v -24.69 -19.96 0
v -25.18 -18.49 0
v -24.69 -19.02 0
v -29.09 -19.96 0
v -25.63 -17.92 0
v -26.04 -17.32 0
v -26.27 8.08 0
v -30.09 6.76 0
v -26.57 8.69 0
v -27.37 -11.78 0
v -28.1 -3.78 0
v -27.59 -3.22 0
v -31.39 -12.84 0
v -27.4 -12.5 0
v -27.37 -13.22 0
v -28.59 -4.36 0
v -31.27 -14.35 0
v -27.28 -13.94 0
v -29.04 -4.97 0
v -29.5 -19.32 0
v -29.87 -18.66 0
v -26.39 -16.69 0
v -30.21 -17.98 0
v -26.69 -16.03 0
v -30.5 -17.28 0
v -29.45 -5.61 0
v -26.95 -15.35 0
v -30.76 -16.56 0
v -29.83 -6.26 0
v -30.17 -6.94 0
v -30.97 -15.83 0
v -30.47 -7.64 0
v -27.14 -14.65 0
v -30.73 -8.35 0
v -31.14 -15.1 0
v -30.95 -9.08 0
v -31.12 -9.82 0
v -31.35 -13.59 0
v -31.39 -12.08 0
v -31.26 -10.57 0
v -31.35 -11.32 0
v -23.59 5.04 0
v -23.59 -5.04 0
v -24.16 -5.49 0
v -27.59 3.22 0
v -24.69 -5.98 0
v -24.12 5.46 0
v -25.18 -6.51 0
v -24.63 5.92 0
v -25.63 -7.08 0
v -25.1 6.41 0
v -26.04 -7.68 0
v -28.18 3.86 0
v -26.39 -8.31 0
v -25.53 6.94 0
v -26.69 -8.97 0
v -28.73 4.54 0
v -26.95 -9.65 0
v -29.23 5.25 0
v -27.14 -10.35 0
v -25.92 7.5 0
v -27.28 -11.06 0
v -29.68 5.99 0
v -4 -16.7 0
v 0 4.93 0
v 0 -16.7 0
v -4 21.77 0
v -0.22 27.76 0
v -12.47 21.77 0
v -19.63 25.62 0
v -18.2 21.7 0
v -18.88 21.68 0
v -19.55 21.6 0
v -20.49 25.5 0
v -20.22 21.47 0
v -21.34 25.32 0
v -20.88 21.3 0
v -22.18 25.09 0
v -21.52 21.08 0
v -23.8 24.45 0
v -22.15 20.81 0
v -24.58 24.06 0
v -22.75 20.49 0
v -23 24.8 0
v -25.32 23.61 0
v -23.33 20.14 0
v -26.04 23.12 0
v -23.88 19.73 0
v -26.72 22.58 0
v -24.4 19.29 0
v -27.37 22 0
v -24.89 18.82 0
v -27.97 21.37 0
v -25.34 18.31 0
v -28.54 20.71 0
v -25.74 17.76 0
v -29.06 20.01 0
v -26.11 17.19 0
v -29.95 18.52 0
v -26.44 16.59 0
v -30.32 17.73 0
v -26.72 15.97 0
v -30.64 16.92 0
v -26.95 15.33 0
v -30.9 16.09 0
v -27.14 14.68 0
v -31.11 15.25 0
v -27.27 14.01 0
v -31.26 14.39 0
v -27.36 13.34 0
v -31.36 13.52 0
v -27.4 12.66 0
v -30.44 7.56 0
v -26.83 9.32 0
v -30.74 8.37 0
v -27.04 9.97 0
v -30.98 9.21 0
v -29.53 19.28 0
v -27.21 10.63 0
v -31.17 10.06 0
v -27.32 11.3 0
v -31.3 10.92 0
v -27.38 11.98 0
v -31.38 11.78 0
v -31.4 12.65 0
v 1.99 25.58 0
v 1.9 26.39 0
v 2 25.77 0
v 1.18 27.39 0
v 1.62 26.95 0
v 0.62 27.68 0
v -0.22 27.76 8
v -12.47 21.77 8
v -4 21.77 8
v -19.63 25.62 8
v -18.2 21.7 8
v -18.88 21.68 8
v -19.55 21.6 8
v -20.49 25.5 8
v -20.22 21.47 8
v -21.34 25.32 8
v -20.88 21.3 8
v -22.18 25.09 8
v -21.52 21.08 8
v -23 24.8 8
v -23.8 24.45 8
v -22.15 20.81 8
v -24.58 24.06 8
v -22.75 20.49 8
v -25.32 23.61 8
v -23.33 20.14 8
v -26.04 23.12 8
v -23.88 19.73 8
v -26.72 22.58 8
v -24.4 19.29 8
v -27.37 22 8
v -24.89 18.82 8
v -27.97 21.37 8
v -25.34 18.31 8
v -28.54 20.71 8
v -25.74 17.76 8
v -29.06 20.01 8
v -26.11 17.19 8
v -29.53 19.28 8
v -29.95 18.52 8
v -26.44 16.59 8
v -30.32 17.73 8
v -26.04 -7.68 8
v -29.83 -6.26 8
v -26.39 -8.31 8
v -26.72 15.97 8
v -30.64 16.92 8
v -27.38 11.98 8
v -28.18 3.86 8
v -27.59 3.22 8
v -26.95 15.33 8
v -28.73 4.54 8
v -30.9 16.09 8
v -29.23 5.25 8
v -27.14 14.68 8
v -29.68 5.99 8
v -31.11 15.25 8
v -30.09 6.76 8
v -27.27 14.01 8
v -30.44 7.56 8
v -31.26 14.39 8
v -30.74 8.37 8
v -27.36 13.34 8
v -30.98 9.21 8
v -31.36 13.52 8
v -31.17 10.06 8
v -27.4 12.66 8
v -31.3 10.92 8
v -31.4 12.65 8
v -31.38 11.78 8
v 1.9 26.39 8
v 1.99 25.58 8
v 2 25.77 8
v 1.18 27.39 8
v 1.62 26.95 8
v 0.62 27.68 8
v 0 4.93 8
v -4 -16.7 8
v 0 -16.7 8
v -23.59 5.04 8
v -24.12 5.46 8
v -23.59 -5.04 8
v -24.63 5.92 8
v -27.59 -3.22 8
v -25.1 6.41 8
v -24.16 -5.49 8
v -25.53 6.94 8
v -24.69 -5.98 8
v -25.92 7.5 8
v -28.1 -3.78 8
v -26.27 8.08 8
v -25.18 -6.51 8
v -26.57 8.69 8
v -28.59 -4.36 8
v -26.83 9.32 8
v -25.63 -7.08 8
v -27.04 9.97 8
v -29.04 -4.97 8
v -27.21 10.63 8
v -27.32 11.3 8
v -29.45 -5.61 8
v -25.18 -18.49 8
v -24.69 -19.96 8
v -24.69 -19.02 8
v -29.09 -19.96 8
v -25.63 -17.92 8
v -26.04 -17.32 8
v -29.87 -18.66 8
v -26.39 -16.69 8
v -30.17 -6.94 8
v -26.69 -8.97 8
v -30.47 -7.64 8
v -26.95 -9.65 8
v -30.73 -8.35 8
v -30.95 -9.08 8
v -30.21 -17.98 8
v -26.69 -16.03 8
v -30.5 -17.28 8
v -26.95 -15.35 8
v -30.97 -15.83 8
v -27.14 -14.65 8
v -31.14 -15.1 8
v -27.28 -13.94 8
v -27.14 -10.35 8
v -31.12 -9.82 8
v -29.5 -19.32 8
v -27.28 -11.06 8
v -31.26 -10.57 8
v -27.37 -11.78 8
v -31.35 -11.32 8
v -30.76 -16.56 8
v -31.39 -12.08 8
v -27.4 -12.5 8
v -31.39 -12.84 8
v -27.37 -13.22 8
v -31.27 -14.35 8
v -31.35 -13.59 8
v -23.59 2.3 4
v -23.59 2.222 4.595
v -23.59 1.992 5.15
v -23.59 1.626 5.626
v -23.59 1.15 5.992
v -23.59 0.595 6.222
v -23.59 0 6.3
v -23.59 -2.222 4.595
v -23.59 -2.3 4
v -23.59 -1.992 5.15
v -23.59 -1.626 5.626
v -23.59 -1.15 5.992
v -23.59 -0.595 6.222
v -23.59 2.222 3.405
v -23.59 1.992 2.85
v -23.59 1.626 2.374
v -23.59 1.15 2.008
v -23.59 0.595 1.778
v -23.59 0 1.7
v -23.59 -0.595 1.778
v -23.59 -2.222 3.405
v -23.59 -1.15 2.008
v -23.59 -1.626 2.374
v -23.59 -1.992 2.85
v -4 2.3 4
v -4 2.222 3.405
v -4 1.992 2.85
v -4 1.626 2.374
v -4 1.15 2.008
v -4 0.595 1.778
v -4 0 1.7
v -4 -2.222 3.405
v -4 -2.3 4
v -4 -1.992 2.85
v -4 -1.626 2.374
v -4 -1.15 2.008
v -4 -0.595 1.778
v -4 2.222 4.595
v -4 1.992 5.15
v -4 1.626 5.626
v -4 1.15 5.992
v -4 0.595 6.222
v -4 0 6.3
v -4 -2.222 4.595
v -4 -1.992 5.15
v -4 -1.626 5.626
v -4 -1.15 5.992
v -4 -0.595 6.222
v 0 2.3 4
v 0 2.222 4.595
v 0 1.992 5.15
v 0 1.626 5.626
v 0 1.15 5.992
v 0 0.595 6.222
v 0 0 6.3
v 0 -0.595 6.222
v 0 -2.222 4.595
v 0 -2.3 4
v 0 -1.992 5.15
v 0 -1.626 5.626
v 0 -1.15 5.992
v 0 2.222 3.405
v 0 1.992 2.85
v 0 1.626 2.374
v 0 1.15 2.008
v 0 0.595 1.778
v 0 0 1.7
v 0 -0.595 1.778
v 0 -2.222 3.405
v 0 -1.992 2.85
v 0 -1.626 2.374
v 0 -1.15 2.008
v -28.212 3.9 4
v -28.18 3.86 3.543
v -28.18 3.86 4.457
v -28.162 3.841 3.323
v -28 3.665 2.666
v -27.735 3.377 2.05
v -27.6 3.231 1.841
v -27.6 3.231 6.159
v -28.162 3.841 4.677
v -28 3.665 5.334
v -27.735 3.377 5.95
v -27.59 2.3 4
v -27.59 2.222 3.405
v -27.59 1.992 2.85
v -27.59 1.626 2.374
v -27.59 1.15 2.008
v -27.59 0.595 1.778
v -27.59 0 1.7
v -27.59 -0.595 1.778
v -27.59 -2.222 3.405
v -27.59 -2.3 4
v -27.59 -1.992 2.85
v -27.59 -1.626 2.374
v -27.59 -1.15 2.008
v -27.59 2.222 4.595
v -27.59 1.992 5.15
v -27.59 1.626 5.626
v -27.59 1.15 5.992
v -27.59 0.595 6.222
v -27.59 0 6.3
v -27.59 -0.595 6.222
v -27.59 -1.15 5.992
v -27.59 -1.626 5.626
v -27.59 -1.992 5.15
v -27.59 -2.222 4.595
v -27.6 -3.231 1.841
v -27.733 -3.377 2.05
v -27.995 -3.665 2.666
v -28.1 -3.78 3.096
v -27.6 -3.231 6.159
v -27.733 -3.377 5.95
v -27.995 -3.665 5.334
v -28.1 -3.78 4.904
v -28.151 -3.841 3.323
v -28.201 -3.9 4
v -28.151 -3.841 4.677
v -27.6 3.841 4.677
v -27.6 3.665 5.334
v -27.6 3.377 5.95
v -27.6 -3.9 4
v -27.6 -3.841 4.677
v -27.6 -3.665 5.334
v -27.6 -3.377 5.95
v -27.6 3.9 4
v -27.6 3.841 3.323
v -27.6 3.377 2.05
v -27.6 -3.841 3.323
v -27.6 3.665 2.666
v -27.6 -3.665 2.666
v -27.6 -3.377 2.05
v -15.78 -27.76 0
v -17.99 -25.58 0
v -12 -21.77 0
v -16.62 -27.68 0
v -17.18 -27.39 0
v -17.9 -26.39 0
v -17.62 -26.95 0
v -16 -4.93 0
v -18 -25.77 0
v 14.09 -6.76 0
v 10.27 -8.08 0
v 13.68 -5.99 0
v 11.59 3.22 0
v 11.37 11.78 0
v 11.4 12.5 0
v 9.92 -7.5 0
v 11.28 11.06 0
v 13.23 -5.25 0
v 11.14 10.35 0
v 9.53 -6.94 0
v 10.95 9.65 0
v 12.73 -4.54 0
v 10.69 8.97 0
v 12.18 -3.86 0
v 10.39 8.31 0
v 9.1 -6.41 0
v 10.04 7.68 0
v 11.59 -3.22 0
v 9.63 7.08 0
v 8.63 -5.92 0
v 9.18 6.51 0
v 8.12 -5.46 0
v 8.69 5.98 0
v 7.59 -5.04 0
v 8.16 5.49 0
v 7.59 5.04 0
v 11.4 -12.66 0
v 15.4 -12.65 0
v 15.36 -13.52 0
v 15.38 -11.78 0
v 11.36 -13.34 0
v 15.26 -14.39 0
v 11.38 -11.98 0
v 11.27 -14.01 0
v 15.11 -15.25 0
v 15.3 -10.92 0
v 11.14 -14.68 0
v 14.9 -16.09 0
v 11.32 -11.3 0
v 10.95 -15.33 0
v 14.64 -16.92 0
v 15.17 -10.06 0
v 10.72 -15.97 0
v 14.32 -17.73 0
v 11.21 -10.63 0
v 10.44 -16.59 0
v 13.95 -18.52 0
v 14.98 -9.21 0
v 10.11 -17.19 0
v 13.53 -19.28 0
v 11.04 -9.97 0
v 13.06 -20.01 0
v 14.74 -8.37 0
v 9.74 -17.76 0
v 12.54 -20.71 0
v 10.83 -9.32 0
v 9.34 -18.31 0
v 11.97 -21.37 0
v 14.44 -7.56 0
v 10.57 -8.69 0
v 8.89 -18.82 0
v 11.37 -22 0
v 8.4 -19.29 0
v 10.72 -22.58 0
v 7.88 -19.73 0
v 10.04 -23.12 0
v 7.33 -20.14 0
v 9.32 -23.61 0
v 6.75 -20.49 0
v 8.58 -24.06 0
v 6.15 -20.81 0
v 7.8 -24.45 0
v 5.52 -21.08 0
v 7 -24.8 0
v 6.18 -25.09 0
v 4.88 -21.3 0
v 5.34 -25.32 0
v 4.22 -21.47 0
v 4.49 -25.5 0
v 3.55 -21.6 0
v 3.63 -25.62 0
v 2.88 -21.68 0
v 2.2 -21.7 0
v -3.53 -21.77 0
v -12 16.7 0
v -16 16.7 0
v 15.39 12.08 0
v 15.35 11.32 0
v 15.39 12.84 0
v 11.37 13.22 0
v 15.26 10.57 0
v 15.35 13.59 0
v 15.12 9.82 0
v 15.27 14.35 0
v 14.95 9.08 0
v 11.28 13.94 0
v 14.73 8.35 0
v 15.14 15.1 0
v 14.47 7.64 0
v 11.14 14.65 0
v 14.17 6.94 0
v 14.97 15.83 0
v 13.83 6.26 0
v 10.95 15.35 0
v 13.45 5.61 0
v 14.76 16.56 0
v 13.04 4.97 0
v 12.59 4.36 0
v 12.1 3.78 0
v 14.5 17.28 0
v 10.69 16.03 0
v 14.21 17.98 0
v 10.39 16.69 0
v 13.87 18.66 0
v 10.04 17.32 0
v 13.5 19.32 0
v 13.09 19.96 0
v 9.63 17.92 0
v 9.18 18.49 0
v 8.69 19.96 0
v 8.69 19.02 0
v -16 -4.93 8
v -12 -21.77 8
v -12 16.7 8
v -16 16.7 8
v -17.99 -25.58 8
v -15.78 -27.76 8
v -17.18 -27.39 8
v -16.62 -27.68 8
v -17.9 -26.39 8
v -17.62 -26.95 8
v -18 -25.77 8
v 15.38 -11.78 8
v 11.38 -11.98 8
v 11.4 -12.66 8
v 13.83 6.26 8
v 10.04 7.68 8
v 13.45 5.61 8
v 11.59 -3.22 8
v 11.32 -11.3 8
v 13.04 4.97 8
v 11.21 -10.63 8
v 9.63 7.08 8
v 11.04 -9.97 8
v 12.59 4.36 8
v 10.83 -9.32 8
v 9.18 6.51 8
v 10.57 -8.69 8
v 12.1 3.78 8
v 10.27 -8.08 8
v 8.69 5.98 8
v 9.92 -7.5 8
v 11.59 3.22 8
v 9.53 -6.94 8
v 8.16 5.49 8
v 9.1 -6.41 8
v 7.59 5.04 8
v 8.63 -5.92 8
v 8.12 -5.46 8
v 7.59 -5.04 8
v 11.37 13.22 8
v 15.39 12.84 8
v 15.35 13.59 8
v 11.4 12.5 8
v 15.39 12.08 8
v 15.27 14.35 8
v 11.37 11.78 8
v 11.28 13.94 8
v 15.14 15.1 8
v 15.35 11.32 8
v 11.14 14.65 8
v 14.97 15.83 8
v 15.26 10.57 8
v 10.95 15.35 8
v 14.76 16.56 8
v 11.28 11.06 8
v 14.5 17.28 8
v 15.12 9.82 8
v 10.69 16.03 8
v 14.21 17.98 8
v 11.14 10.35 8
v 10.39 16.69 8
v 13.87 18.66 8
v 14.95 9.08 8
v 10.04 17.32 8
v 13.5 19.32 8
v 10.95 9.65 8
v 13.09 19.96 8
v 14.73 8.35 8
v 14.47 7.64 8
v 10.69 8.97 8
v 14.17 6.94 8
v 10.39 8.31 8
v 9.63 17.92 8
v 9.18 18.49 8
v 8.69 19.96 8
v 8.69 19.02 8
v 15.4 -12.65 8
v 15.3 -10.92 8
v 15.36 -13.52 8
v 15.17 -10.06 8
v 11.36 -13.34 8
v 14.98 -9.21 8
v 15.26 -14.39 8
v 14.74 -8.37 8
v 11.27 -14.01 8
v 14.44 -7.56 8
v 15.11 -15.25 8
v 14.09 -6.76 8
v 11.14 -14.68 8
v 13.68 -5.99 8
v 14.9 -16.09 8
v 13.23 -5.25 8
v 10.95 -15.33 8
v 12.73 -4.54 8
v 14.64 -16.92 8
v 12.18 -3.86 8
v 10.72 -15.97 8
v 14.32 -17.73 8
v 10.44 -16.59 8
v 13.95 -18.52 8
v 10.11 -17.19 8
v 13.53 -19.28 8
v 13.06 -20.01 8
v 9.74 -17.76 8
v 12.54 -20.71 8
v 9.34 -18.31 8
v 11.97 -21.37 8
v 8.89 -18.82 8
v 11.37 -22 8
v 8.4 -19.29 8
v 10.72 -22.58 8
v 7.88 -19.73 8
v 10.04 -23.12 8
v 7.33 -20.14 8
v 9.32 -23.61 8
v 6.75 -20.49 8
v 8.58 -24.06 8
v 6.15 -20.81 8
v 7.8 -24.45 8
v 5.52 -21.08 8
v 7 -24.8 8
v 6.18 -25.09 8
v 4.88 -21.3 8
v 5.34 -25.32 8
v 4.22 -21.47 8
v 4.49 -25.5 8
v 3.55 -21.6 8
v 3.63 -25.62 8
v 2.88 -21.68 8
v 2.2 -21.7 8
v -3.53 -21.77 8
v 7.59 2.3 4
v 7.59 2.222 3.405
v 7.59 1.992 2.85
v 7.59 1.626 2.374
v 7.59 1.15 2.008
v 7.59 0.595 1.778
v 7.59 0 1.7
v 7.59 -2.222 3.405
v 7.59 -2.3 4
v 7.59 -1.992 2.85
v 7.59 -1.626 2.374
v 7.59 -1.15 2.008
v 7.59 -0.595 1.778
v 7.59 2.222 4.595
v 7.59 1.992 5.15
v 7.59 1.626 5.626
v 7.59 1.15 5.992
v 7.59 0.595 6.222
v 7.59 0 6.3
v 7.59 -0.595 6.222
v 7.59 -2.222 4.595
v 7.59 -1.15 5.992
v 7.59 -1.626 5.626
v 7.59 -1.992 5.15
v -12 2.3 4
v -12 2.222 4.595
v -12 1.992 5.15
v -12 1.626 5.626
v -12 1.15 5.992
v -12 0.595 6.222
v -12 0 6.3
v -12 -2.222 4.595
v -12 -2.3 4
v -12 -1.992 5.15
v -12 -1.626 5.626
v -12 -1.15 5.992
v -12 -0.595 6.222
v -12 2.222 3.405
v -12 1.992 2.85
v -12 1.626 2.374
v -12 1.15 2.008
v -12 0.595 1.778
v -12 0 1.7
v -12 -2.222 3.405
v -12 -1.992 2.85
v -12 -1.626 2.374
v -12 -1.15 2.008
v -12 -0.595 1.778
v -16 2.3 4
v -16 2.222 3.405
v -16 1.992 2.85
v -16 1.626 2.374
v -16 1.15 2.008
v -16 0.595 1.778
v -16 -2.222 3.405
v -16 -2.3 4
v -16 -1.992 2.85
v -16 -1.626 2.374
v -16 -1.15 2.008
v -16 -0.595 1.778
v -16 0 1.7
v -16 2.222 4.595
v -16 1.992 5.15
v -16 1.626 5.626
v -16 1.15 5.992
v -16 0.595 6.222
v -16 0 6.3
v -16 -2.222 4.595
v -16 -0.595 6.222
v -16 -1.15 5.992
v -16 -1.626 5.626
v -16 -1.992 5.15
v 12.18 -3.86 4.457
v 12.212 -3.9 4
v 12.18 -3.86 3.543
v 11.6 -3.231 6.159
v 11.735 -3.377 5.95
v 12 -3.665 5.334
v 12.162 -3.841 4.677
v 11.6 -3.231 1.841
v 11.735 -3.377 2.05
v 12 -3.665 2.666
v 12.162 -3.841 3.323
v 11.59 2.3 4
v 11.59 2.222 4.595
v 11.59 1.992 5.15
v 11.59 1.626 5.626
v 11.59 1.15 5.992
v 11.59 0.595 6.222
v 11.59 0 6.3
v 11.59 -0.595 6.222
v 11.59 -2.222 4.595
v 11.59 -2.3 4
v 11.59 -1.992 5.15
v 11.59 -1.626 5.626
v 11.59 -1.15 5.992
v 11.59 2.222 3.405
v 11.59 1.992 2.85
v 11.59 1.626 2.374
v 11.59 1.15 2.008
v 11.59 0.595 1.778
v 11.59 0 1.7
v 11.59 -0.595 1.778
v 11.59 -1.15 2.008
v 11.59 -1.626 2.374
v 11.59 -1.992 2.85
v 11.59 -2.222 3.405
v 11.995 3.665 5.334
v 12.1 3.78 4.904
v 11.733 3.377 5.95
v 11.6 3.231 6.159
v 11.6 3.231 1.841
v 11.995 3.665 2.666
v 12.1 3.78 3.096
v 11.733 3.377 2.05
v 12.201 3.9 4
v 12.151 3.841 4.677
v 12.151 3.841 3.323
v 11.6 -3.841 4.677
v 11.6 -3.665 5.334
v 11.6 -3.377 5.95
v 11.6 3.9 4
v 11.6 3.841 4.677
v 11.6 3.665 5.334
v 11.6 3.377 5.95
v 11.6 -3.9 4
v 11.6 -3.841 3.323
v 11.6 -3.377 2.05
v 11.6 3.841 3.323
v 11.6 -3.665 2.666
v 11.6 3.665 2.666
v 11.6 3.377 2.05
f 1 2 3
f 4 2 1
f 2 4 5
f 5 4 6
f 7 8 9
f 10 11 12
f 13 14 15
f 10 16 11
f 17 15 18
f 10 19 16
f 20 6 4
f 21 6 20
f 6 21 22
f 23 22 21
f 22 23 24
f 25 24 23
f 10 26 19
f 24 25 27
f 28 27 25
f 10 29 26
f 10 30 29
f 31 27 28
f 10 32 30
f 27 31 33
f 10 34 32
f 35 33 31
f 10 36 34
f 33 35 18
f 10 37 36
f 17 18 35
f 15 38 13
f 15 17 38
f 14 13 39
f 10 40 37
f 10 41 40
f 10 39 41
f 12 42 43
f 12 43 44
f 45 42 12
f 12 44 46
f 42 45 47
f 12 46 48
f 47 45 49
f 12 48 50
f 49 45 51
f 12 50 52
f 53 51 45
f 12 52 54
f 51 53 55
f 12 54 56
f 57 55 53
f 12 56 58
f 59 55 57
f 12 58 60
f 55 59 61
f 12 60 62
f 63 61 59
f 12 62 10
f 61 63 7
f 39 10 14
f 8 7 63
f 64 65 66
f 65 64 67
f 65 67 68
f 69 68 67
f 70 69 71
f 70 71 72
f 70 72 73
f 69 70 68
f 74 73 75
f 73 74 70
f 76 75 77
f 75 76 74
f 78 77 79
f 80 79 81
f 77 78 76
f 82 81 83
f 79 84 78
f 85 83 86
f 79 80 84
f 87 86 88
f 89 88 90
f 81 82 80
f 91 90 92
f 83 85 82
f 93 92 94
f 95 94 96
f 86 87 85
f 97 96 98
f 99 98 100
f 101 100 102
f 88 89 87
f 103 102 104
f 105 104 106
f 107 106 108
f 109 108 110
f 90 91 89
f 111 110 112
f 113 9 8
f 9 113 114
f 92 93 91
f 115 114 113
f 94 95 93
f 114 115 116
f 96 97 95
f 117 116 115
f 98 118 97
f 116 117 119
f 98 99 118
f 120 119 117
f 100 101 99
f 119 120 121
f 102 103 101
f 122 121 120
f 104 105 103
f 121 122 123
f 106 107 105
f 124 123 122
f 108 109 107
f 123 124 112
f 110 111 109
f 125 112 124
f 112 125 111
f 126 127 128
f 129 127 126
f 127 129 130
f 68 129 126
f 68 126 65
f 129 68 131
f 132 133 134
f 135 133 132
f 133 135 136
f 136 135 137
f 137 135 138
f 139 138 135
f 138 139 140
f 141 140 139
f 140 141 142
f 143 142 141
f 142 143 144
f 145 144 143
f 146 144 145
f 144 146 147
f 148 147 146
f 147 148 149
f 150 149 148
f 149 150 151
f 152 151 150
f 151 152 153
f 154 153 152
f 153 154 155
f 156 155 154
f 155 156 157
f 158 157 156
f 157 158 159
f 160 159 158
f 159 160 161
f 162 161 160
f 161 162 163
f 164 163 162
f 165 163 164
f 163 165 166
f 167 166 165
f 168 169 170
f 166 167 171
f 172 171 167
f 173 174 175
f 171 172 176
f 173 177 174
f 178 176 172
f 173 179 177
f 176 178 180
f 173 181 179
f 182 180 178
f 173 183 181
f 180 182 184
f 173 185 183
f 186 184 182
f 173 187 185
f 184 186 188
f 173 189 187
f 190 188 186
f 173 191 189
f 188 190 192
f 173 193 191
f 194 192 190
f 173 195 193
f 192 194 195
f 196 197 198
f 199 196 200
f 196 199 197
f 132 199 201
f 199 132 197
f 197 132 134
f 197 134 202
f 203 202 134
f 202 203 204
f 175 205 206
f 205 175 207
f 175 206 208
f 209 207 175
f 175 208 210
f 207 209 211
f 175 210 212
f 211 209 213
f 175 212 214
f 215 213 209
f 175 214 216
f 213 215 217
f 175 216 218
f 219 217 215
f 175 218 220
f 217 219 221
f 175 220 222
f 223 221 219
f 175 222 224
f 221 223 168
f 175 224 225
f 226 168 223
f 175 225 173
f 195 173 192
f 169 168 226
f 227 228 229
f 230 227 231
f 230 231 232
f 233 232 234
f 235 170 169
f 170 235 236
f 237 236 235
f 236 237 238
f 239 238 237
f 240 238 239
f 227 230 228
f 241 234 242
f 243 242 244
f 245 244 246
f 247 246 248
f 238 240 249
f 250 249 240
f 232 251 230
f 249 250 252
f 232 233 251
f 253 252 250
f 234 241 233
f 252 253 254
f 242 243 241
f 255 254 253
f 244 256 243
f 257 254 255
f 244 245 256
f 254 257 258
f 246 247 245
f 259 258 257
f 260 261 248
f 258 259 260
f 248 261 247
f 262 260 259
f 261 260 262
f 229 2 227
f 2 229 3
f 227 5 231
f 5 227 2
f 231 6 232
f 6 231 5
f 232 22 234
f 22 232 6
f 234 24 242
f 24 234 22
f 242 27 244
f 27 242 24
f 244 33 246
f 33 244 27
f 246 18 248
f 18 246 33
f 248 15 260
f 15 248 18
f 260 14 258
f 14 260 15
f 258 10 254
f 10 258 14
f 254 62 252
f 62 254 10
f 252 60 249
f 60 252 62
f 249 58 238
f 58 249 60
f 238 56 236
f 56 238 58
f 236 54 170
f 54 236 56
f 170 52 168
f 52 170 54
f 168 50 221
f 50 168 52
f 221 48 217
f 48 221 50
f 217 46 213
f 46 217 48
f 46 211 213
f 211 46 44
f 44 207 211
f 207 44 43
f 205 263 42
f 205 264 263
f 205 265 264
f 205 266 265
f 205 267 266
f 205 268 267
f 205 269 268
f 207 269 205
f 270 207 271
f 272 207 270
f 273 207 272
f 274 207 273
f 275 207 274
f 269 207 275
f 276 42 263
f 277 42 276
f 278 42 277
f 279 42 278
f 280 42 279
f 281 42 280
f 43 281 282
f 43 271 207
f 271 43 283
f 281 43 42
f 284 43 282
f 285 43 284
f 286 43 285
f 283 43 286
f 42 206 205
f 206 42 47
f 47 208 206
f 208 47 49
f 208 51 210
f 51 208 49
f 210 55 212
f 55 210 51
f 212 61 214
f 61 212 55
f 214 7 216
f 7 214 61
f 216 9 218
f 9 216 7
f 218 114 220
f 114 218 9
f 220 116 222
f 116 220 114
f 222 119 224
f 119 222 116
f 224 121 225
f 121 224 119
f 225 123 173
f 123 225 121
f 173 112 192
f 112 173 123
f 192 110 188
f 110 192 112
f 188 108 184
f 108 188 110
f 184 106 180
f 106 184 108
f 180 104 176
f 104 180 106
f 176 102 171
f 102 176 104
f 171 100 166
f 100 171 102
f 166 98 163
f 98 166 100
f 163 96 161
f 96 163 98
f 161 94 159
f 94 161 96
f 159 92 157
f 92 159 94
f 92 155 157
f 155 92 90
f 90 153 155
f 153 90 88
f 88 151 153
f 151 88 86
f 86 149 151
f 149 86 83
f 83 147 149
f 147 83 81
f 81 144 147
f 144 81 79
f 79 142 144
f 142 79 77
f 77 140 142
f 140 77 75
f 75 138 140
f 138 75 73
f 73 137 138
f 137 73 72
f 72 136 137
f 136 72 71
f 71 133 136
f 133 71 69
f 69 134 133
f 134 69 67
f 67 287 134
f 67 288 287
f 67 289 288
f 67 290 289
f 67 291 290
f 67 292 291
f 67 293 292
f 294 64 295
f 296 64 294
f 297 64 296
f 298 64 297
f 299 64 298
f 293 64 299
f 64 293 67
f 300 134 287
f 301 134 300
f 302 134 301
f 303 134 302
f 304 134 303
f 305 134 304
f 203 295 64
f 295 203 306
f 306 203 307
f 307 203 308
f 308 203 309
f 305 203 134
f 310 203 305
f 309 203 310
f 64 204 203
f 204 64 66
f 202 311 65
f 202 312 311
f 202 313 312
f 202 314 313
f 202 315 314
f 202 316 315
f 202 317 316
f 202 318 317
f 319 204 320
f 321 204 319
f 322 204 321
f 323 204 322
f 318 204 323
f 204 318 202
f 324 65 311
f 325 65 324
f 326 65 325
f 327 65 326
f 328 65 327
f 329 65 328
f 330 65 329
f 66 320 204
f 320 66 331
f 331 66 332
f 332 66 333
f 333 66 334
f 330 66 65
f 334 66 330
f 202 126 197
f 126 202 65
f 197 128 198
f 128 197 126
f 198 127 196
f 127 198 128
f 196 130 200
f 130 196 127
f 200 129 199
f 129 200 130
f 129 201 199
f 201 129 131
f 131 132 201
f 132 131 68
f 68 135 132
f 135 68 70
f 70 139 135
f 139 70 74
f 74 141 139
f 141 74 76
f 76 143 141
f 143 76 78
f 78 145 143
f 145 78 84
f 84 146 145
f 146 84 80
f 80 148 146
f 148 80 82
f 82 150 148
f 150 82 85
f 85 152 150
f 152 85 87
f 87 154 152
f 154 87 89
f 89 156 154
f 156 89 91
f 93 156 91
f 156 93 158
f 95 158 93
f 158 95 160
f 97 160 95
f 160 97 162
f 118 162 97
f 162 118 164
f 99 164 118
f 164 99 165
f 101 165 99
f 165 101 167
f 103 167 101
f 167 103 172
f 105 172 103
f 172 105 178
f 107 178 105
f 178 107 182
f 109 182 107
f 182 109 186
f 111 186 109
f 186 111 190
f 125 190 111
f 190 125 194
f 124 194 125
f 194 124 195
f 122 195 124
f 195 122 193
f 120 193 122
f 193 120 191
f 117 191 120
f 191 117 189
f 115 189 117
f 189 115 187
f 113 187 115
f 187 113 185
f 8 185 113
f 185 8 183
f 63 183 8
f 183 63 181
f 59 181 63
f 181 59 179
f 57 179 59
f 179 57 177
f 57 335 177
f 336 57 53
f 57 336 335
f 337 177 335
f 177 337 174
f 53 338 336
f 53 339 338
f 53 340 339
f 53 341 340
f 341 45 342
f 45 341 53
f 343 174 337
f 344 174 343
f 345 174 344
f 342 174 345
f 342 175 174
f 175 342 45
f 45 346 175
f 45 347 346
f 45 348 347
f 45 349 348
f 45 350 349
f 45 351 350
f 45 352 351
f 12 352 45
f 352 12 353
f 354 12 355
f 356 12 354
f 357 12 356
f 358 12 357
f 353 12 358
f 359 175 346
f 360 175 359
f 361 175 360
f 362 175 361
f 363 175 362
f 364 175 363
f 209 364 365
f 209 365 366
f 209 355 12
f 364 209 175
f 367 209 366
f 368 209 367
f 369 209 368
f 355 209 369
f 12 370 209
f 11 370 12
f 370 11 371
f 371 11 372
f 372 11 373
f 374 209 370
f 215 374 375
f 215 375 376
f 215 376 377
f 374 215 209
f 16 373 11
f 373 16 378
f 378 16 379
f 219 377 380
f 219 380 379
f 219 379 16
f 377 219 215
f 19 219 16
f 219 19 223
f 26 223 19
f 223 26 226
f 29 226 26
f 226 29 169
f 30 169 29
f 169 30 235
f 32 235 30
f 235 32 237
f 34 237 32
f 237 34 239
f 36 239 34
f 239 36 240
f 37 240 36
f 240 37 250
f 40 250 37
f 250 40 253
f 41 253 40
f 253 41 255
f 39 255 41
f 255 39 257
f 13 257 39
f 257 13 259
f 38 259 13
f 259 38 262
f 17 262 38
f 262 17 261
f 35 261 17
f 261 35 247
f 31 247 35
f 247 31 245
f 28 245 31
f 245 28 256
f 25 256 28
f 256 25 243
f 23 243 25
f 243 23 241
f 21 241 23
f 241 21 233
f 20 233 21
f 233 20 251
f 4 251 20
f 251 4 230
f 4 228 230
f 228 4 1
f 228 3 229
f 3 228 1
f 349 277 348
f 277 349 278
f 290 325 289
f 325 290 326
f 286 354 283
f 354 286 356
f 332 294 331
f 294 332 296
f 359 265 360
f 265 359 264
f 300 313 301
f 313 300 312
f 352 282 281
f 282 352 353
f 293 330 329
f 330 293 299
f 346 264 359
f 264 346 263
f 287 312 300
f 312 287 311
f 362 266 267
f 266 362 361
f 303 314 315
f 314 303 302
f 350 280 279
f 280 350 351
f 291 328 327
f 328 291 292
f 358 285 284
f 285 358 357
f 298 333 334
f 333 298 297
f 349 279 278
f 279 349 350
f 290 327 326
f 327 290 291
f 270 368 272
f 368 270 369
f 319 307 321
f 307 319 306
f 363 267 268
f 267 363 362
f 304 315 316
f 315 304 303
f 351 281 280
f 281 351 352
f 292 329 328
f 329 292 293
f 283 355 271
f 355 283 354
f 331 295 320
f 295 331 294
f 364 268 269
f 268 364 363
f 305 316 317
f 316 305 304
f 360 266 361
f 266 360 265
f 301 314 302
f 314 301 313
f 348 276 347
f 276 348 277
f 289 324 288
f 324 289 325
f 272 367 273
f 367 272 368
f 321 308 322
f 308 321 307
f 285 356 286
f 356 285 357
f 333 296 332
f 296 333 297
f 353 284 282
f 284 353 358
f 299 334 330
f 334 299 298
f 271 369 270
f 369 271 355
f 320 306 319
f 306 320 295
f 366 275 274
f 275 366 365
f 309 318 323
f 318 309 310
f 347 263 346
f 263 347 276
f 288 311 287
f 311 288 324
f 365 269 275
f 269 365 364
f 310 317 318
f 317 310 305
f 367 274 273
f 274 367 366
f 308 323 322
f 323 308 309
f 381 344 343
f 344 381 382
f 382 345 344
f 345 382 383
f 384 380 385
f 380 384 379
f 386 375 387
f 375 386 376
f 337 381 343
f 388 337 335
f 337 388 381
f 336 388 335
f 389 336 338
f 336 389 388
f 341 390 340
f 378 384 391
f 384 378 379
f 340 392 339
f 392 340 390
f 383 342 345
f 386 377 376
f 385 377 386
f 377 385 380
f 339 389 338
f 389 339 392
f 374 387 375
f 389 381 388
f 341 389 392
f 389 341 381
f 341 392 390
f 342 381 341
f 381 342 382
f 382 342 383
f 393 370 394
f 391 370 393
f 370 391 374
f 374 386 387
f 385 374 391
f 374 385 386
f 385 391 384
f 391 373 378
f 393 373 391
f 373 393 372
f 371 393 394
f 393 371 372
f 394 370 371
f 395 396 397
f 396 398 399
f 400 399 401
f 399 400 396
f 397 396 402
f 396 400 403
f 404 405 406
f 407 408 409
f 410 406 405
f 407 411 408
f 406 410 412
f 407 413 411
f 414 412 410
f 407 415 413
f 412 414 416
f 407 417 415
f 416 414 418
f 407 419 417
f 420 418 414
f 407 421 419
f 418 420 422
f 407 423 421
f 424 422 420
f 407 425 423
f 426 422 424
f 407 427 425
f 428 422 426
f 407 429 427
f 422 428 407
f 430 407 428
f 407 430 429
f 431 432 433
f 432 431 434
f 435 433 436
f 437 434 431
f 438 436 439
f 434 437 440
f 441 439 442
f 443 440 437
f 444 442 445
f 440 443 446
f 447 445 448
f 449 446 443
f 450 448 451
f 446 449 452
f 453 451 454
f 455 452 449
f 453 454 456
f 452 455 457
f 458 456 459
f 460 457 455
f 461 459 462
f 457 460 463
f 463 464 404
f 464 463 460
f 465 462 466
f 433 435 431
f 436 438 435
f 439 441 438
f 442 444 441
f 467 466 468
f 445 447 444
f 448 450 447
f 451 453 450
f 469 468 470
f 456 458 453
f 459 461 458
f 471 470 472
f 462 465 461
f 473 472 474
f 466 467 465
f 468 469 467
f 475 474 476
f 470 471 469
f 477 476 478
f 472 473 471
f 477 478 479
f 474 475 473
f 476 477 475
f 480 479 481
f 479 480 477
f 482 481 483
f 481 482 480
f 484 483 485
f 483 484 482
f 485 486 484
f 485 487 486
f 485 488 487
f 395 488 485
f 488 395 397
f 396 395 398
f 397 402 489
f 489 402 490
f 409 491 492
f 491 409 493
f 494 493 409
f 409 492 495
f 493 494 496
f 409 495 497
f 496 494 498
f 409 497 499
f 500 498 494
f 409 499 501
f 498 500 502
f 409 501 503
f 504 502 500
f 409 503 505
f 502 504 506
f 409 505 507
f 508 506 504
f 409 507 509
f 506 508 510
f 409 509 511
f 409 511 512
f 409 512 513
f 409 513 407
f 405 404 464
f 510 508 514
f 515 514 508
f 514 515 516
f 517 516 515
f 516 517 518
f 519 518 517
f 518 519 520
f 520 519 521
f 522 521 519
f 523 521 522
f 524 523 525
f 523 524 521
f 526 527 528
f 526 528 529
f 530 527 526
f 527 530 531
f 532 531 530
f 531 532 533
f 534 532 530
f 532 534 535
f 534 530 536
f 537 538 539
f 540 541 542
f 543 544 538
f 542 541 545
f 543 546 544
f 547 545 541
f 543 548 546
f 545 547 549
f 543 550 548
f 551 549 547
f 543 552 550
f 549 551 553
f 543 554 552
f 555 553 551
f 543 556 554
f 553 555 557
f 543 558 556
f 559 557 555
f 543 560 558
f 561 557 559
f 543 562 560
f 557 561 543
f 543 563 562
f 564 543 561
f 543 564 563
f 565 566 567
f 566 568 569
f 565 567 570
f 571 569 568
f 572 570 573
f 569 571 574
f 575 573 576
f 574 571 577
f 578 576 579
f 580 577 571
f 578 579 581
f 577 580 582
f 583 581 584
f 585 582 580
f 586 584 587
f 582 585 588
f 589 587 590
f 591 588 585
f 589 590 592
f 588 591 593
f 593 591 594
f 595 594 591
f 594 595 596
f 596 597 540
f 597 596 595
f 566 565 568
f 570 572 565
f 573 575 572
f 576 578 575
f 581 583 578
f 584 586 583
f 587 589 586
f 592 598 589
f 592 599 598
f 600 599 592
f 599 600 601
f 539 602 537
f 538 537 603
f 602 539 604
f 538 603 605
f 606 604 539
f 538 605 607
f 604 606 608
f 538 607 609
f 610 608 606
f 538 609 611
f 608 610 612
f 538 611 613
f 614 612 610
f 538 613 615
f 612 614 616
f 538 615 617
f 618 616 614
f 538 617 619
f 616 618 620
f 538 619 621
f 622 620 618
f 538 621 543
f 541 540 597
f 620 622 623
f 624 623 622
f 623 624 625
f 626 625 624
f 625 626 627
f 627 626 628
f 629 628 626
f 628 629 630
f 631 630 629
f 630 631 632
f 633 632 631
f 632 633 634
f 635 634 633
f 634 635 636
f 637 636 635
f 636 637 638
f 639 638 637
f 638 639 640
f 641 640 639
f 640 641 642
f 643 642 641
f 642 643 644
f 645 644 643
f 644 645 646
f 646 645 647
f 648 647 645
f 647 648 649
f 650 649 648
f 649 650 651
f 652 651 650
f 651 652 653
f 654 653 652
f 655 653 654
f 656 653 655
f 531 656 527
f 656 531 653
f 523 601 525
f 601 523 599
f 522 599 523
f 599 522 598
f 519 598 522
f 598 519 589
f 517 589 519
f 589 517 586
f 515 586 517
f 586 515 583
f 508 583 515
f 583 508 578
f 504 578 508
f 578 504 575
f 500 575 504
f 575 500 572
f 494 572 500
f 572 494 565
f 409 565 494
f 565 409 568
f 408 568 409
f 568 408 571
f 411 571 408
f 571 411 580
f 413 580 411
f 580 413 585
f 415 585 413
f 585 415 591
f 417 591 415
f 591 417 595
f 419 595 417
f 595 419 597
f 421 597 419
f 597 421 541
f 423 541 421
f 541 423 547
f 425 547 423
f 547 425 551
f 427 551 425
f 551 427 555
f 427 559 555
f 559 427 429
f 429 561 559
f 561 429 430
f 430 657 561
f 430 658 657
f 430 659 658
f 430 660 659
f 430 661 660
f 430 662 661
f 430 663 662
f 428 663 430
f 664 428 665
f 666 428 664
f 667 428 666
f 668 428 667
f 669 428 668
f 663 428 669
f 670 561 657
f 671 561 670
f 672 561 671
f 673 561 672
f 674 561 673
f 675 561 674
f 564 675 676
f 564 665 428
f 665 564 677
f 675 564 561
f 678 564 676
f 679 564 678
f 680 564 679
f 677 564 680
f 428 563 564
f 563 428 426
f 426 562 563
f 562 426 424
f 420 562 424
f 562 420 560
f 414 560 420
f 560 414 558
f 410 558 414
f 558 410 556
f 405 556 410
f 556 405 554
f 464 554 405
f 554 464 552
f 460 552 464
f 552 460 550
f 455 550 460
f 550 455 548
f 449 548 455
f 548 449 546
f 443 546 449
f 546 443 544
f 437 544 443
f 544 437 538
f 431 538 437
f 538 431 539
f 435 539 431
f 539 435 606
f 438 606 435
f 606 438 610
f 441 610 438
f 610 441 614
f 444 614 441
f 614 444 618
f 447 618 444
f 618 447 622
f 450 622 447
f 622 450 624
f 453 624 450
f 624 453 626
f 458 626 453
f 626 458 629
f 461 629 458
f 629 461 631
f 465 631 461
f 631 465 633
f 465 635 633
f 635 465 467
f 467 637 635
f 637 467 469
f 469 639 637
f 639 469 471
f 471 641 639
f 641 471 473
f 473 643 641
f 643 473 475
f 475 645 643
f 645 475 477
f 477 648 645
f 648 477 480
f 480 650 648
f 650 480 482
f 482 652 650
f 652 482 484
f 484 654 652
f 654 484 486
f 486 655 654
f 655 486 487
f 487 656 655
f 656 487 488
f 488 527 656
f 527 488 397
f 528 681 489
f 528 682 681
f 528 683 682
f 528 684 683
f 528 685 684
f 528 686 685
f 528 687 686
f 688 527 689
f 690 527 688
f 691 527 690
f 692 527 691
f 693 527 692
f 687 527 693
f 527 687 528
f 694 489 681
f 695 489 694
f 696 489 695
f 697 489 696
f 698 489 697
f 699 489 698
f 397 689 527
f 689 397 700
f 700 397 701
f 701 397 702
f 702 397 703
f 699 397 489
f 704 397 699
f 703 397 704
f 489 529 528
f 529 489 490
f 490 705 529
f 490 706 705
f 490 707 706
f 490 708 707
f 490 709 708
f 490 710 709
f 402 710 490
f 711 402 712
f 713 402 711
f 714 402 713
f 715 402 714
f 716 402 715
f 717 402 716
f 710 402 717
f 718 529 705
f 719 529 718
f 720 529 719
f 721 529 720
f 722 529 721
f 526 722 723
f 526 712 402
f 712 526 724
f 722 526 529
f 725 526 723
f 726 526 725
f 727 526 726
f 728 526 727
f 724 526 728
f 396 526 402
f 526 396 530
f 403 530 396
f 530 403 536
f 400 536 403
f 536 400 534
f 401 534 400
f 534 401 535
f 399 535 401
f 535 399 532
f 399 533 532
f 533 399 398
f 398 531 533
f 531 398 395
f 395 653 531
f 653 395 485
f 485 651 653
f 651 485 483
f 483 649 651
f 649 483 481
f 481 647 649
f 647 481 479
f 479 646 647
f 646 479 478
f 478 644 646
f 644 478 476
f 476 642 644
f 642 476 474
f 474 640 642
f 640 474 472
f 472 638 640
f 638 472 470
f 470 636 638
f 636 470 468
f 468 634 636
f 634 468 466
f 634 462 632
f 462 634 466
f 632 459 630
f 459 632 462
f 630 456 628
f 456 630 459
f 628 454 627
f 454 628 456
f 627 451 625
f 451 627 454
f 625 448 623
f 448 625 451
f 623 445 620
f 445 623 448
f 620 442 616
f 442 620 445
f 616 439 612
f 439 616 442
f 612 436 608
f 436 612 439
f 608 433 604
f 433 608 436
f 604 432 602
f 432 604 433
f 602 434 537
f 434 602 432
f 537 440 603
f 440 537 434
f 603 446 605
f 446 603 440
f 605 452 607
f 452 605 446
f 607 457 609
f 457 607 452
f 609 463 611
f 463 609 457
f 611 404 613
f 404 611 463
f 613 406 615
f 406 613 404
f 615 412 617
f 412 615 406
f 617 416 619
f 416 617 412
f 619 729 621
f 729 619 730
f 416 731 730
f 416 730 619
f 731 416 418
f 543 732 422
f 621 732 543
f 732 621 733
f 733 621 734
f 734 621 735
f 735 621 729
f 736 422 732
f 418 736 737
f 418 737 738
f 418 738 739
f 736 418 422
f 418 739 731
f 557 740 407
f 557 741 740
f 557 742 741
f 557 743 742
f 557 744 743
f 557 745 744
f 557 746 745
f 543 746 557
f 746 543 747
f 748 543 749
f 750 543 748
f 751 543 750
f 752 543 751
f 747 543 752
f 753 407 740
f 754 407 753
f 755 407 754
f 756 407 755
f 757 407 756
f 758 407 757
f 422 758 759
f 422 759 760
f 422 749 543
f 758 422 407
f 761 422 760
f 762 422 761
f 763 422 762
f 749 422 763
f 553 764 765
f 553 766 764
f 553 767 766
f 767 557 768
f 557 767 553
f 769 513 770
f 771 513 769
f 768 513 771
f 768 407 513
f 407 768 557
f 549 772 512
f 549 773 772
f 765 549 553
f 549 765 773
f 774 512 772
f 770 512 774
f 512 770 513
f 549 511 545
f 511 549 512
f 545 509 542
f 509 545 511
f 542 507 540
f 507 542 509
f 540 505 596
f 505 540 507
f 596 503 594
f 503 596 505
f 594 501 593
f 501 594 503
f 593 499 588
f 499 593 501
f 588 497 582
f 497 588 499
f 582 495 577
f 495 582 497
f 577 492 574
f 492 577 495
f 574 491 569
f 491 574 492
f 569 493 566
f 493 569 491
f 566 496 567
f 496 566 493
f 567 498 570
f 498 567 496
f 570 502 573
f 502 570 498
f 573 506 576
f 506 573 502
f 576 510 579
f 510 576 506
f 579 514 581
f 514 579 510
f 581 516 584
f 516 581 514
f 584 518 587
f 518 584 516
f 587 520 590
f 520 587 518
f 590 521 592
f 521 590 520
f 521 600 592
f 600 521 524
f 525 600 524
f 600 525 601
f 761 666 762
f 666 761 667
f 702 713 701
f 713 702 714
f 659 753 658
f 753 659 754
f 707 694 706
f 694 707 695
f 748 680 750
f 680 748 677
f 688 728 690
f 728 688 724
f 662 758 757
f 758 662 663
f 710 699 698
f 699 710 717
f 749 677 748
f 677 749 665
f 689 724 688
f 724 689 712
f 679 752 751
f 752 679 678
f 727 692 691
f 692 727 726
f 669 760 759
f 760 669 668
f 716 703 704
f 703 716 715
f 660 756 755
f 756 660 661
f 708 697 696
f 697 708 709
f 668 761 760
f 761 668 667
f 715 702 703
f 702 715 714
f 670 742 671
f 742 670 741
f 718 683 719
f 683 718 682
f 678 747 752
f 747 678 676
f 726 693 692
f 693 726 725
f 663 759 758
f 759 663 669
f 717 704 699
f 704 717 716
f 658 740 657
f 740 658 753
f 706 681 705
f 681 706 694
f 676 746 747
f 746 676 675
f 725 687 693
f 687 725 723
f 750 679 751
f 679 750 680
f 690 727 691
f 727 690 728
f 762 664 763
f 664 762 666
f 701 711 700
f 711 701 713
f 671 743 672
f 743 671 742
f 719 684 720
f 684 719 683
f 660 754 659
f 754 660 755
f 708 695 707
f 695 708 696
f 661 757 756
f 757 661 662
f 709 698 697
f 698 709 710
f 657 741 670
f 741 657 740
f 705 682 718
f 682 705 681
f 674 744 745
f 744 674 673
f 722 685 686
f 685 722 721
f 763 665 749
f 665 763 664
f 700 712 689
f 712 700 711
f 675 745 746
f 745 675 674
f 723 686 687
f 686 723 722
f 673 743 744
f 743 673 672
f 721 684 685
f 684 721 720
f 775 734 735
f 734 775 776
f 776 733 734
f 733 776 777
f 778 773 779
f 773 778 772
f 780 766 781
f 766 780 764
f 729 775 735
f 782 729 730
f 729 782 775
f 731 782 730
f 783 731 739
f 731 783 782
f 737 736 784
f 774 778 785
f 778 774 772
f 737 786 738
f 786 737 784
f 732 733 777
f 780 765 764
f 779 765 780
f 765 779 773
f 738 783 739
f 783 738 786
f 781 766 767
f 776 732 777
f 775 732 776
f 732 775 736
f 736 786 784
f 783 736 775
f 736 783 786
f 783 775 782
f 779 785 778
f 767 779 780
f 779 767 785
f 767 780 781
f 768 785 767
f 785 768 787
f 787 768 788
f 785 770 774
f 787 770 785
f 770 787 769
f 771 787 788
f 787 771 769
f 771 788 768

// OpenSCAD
//Brackets to hold Horizontal 1/2" EMT to Vertex
//11/25/2016    By: David Bunch
//
Ht = 8;                     //Height of extrusion of Brackets
Bracket_Type = 0;           //0 = Simple Bracket to connect EMT to Vertex
                            //1 = Simple Extended Bracket
                            //2 = Bracket to connect EMT to Vertex & DoveTail Frame
                            //3 = Type 0 & 2
                            //4 = Type 0, 1 & 2
HoleID = 4.6;               //Diameter of hole, sized for M4 or #8 screw
ScrewHdDia = 7.8;            //Diameter of Screw Head
ScrewHd_Res = 36;            //Resolution of screw head
$fn=24;                     //Resolution of drill holes
module Bracket()
{
    difference()
    {
        linear_extrude(height = Ht, center = false, convexity = 10)polygon(points = 
        [[-27.59,-3.22],[-27.59,3.22],[-28.18,3.86],[-28.73,4.54],[-29.23,5.25],
        [-29.68,5.99],[-30.09,6.76],[-30.44,7.56],[-30.74,8.37],[-30.98,9.21],
        [-31.17,10.06],[-31.3,10.92],[-31.38,11.78],[-31.4,12.65],[-31.36,13.52],
        [-31.26,14.39],[-31.11,15.25],[-30.9,16.09],[-30.64,16.92],[-30.32,17.73],
        [-29.95,18.52],[-29.53,19.28],[-29.06,20.01],[-28.54,20.71],[-27.97,21.37],
        [-27.37,22],[-26.72,22.58],[-26.04,23.12],[-25.32,23.61],[-24.58,24.06],
        [-23.8,24.45],[-23,24.8],[-22.18,25.09],[-21.34,25.32],[-20.49,25.5],
        [-19.63,25.62],[-0.22,27.76],[0.62,27.68],[1.18,27.39],[1.62,26.95],
        [1.9,26.39],[2,25.77],[1.99,25.58],[0,4.93],[0,-16.7],
        [-4,-16.7],[-4,21.77],[-12.47,21.77],[-18.2,21.7],[-18.88,21.68],
        [-19.55,21.6],[-20.22,21.47],[-20.88,21.3],[-21.52,21.08],[-22.15,20.81],
        [-22.75,20.49],[-23.33,20.14],[-23.88,19.73],[-24.4,19.29],[-24.89,18.82],
        [-25.34,18.31],[-25.74,17.76],[-26.11,17.19],[-26.44,16.59],[-26.72,15.97],
        [-26.95,15.33],[-27.14,14.68],[-27.27,14.01],[-27.36,13.34],[-27.4,12.66],
        [-27.38,11.98],[-27.32,11.3],[-27.21,10.63],[-27.04,9.97],[-26.83,9.32],
        [-26.57,8.69],[-26.27,8.08],[-25.92,7.5],[-25.53,6.94],[-25.1,6.41],
        [-24.63,5.92],[-24.12,5.46],[-23.59,5.04],[-23.59,-5.04],[-24.16,-5.49],
        [-24.69,-5.98],[-25.18,-6.51],[-25.63,-7.08],[-26.04,-7.68],[-26.39,-8.31],
        [-26.69,-8.97],[-26.95,-9.65],[-27.14,-10.35],[-27.28,-11.06],[-27.37,-11.78],
        [-27.4,-12.5],[-27.37,-13.22],[-27.28,-13.94],[-27.14,-14.65],[-26.95,-15.35],
        [-26.69,-16.03],[-26.39,-16.69],[-26.04,-17.32],[-25.63,-17.92],[-25.18,-18.49],
        [-24.69,-19.02],[-24.69,-19.96],[-29.09,-19.96],[-29.5,-19.32],[-29.87,-18.66],
        [-30.21,-17.98],[-30.5,-17.28],[-30.76,-16.56],[-30.97,-15.83],[-31.14,-15.1],
        [-31.27,-14.35],[-31.35,-13.59],[-31.39,-12.84],[-31.39,-12.08],[-31.35,-11.32],
        [-31.26,-10.57],[-31.12,-9.82],[-30.95,-9.08],[-30.73,-8.35],[-30.47,-7.64],
        [-30.17,-6.94],[-29.83,-6.26],[-29.45,-5.61],[-29.04,-4.97],[-28.59,-4.36],
        [-28.1,-3.78]]);
        translate([0,0,Ht/2])
        rotate([0,90,0])
        cylinder(d=HoleID,h=100,center=true);
        translate([-27.6,0,Ht/2])
        rotate([0,-90,0])
        cylinder(d=ScrewHdDia,h=10,$fn=ScrewHd_Res);
    }
}
module VertexFrameBracket()
{
    difference()
    {
    linear_extrude(height = Ht, center = false, convexity = 10)polygon(points = 
    [[-27.59,-3.22],[-27.59,3.22],[-28.18,3.86],[-28.73,4.54],[-29.23,5.25],
    [-29.68,5.99],[-30.09,6.76],[-30.44,7.56],[-30.74,8.37],[-30.98,9.21],
    [-31.17,10.06],[-31.3,10.92],[-31.38,11.78],[-31.4,12.65],[-31.36,13.52],
    [-31.26,14.39],[-31.11,15.25],[-30.9,16.09],[-30.64,16.92],[-30.32,17.73],
    [-29.95,18.52],[-29.53,19.28],[-29.06,20.01],[-28.54,20.71],[-27.97,21.37],
    [-27.37,22],[-26.72,22.58],[-26.04,23.12],[-25.32,23.61],[-24.58,24.06],
    [-23.8,24.45],[-23,24.8],[-22.18,25.09],[-21.34,25.32],[-20.49,25.5],
    [-19.63,25.62],[-0.22,27.76],[0.62,27.68],[1.18,27.39],[1.62,26.95],
    [1.9,26.39],[2,25.77],[1.99,25.58],[4,10.26],[4,-16.7],
    [0,-16.7],[0,6.26],[-4,10.26],[-4,21.77],[-12.47,21.77],
    [-18.2,21.7],[-18.88,21.68],[-19.55,21.6],[-20.22,21.47],[-20.88,21.3],
    [-21.52,21.08],[-22.15,20.81],[-22.75,20.49],[-23.33,20.14],[-23.88,19.73],
    [-24.4,19.29],[-24.89,18.82],[-25.34,18.31],[-25.74,17.76],[-26.11,17.19],
    [-26.44,16.59],[-26.72,15.97],[-26.95,15.33],[-27.14,14.68],[-27.27,14.01],
    [-27.36,13.34],[-27.4,12.66],[-27.38,11.98],[-27.32,11.3],[-27.21,10.63],
    [-27.04,9.97],[-26.83,9.32],[-26.57,8.69],[-26.27,8.08],[-25.92,7.5],
    [-25.53,6.94],[-25.1,6.41],[-24.63,5.92],[-24.12,5.46],[-23.59,5.04],
    [-23.59,-5.04],[-24.16,-5.49],[-24.69,-5.98],[-25.18,-6.51],[-25.63,-7.08],
    [-26.04,-7.68],[-26.39,-8.31],[-26.69,-8.97],[-26.95,-9.65],[-27.14,-10.35],
    [-27.28,-11.06],[-27.37,-11.78],[-27.4,-12.5],[-27.37,-13.22],[-27.28,-13.94],
    [-27.14,-14.65],[-26.95,-15.35],[-26.69,-16.03],[-26.39,-16.69],[-26.04,-17.32],
    [-25.63,-17.92],[-25.18,-18.49],[-24.69,-19.02],[-24.69,-19.96],[-29.09,-19.96],
    [-29.5,-19.32],[-29.87,-18.66],[-30.21,-17.98],[-30.5,-17.28],[-30.76,-16.56],
    [-30.97,-15.83],[-31.14,-15.1],[-31.27,-14.35],[-31.35,-13.59],[-31.39,-12.84],
    [-31.39,-12.08],[-31.35,-11.32],[-31.26,-10.57],[-31.12,-9.82],[-30.95,-9.08],
    [-30.73,-8.35],[-30.47,-7.64],[-30.17,-6.94],[-29.83,-6.26],[-29.45,-5.61],
    [-29.04,-4.97],[-28.59,-4.36],[-28.1,-3.78]]);
        translate([0,0,Ht/2])
        rotate([0,90,0])
        cylinder(d=HoleID,h=100,center=true);
        translate([-27.6,0,Ht/2])
        rotate([0,-90,0])
        cylinder(d=ScrewHdDia,h=10,$fn=ScrewHd_Res);
    }
}
module ExtBracket()
{
    difference()
    {
        linear_extrude(height = Ht, center = false, convexity = 10)polygon(points = 
        [[-27.59,-3.22],[-27.59,3.22],[-28.18,3.86],[-28.73,4.54],[-29.23,5.25],
        [-29.68,5.99],[-30.09,6.76],[-30.44,7.56],[-30.74,8.37],[-30.98,9.21],
        [-31.17,10.06],[-31.3,10.92],[-31.38,11.78],[-31.4,12.65],[-31.36,13.52],
        [-31.26,14.39],[-31.11,15.25],[-30.9,16.09],[-30.64,16.92],[-30.32,17.73],
        [-29.95,18.52],[-29.53,19.28],[-29.06,20.01],[-28.54,20.71],[-27.97,21.37],
        [-27.37,22],[-26.72,22.58],[-26.04,23.12],[-25.32,23.61],[-24.58,24.06],
        [-23.8,24.45],[-23,24.8],[-22.18,25.09],[-21.34,25.32],[-20.49,25.5],
        [-19.63,25.62],[-18.2,25.76],[-10,25.77],[-8,27.77],[-8,42.27],
        [-4,42.27],[-4,21.77],[-12.47,21.77],[-18.2,21.7],[-18.88,21.68],
        [-19.55,21.6],[-20.22,21.47],[-20.88,21.3],[-21.52,21.08],[-22.15,20.81],
        [-22.75,20.49],[-23.33,20.14],[-23.88,19.73],[-24.4,19.29],[-24.89,18.82],
        [-25.34,18.31],[-25.74,17.76],[-26.11,17.19],[-26.44,16.59],[-26.72,15.97],
        [-26.95,15.33],[-27.14,14.68],[-27.27,14.01],[-27.36,13.34],[-27.4,12.66],
        [-27.38,11.98],[-27.32,11.3],[-27.21,10.63],[-27.04,9.97],[-26.83,9.32],
        [-26.57,8.69],[-26.27,8.08],[-25.92,7.5],[-25.53,6.94],[-25.1,6.41],
        [-24.63,5.92],[-24.12,5.46],[-23.59,5.04],[-23.59,-5.04],[-24.16,-5.49],
        [-24.69,-5.98],[-25.18,-6.51],[-25.63,-7.08],[-26.04,-7.68],[-26.39,-8.31],
        [-26.69,-8.97],[-26.95,-9.65],[-27.14,-10.35],[-27.28,-11.06],[-27.37,-11.78],
        [-27.4,-12.5],[-27.37,-13.22],[-27.28,-13.94],[-27.14,-14.65],[-26.95,-15.35],
        [-26.69,-16.03],[-26.39,-16.69],[-26.04,-17.32],[-25.63,-17.92],[-25.18,-18.49],
        [-24.69,-19.02],[-24.69,-19.96],[-29.09,-19.96],[-29.5,-19.32],[-29.87,-18.66],
        [-30.21,-17.98],[-30.5,-17.28],[-30.76,-16.56],[-30.97,-15.83],[-31.14,-15.1],
        [-31.27,-14.35],[-31.35,-13.59],[-31.39,-12.84],[-31.39,-12.08],[-31.35,-11.32],
        [-31.26,-10.57],[-31.12,-9.82],[-30.95,-9.08],[-30.73,-8.35],[-30.47,-7.64],
        [-30.17,-6.94],[-29.83,-6.26],[-29.45,-5.61],[-29.04,-4.97],[-28.59,-4.36],
        [-28.1,-3.78]]);
        translate([0,0,Ht/2])
        rotate([0,90,0])
        cylinder(d=HoleID,h=100,center=true);

        translate([-27.6,0,Ht/2])
        rotate([0,-90,0])
        cylinder(d=ScrewHdDia,h=10,$fn=ScrewHd_Res);

        translate([0,35,Ht/2])
        rotate([0,90,0])
        cylinder(d=HoleID,h=100,center=true);
    }
}
module Bump()
{
    translate([0,0,-3])
    cylinder(d1=0,d2=6,h=3.01,$fn=6);
    cylinder(d=6,h=20.8,$fn=6);
    translate([0,0,20.8])
    cylinder(d1=6,d2=0,h=3,$fn=6);
}

module BracketCube()
{
    translate([-8,-25,4])
    rotate([0,0,90])
    //translate([0,0,4])
    rotate([-90,0,0])
    union()
    {
        difference()
        {
            translate([-7.25,0,0])
            cube([49.5,4,Ht]);
            translate([0,-1,Ht/2])
            rotate([-90,0,0])
            cylinder(d=HoleID,h=30,$fn=24);
            translate([35,-1,Ht/2])
            rotate([-90,0,0])
            cylinder(d=HoleID,h=30,$fn=24);
        }
        translate([7.1,0,Ht/2])
        rotate([0,90,0])
        Bump();
    }
}
if (Bracket_Type == 0)
{
    Bracket();
    translate([-16,0,0])
    rotate([0,0,180])
    Bracket();
} else if (Bracket_Type == 1)
{
   for (x = [0,1])
   { 
        rotate([0,0,x * 180])
        translate([x * 8,0,0])
        {
            BracketCube();
            translate([-9,0,0])
            rotate([0,0,180])
            ExtBracket();
        }
    }
} else if (Bracket_Type == 2) 
{
    VertexFrameBracket();
    translate([-14,0,0])
    rotate([0,0,180])
    VertexFrameBracket();
} else if (Bracket_Type == 3)
{
    Bracket();
    translate([-14,0,0])
    rotate([0,0,180])
    VertexFrameBracket();
} else if (Bracket_Type == 4)
{
    Bracket();
    BracketCube();
    translate([-9,0,0])
    rotate([0,0,180])
    ExtBracket();
    translate([34,2,0])
    VertexFrameBracket();
}
